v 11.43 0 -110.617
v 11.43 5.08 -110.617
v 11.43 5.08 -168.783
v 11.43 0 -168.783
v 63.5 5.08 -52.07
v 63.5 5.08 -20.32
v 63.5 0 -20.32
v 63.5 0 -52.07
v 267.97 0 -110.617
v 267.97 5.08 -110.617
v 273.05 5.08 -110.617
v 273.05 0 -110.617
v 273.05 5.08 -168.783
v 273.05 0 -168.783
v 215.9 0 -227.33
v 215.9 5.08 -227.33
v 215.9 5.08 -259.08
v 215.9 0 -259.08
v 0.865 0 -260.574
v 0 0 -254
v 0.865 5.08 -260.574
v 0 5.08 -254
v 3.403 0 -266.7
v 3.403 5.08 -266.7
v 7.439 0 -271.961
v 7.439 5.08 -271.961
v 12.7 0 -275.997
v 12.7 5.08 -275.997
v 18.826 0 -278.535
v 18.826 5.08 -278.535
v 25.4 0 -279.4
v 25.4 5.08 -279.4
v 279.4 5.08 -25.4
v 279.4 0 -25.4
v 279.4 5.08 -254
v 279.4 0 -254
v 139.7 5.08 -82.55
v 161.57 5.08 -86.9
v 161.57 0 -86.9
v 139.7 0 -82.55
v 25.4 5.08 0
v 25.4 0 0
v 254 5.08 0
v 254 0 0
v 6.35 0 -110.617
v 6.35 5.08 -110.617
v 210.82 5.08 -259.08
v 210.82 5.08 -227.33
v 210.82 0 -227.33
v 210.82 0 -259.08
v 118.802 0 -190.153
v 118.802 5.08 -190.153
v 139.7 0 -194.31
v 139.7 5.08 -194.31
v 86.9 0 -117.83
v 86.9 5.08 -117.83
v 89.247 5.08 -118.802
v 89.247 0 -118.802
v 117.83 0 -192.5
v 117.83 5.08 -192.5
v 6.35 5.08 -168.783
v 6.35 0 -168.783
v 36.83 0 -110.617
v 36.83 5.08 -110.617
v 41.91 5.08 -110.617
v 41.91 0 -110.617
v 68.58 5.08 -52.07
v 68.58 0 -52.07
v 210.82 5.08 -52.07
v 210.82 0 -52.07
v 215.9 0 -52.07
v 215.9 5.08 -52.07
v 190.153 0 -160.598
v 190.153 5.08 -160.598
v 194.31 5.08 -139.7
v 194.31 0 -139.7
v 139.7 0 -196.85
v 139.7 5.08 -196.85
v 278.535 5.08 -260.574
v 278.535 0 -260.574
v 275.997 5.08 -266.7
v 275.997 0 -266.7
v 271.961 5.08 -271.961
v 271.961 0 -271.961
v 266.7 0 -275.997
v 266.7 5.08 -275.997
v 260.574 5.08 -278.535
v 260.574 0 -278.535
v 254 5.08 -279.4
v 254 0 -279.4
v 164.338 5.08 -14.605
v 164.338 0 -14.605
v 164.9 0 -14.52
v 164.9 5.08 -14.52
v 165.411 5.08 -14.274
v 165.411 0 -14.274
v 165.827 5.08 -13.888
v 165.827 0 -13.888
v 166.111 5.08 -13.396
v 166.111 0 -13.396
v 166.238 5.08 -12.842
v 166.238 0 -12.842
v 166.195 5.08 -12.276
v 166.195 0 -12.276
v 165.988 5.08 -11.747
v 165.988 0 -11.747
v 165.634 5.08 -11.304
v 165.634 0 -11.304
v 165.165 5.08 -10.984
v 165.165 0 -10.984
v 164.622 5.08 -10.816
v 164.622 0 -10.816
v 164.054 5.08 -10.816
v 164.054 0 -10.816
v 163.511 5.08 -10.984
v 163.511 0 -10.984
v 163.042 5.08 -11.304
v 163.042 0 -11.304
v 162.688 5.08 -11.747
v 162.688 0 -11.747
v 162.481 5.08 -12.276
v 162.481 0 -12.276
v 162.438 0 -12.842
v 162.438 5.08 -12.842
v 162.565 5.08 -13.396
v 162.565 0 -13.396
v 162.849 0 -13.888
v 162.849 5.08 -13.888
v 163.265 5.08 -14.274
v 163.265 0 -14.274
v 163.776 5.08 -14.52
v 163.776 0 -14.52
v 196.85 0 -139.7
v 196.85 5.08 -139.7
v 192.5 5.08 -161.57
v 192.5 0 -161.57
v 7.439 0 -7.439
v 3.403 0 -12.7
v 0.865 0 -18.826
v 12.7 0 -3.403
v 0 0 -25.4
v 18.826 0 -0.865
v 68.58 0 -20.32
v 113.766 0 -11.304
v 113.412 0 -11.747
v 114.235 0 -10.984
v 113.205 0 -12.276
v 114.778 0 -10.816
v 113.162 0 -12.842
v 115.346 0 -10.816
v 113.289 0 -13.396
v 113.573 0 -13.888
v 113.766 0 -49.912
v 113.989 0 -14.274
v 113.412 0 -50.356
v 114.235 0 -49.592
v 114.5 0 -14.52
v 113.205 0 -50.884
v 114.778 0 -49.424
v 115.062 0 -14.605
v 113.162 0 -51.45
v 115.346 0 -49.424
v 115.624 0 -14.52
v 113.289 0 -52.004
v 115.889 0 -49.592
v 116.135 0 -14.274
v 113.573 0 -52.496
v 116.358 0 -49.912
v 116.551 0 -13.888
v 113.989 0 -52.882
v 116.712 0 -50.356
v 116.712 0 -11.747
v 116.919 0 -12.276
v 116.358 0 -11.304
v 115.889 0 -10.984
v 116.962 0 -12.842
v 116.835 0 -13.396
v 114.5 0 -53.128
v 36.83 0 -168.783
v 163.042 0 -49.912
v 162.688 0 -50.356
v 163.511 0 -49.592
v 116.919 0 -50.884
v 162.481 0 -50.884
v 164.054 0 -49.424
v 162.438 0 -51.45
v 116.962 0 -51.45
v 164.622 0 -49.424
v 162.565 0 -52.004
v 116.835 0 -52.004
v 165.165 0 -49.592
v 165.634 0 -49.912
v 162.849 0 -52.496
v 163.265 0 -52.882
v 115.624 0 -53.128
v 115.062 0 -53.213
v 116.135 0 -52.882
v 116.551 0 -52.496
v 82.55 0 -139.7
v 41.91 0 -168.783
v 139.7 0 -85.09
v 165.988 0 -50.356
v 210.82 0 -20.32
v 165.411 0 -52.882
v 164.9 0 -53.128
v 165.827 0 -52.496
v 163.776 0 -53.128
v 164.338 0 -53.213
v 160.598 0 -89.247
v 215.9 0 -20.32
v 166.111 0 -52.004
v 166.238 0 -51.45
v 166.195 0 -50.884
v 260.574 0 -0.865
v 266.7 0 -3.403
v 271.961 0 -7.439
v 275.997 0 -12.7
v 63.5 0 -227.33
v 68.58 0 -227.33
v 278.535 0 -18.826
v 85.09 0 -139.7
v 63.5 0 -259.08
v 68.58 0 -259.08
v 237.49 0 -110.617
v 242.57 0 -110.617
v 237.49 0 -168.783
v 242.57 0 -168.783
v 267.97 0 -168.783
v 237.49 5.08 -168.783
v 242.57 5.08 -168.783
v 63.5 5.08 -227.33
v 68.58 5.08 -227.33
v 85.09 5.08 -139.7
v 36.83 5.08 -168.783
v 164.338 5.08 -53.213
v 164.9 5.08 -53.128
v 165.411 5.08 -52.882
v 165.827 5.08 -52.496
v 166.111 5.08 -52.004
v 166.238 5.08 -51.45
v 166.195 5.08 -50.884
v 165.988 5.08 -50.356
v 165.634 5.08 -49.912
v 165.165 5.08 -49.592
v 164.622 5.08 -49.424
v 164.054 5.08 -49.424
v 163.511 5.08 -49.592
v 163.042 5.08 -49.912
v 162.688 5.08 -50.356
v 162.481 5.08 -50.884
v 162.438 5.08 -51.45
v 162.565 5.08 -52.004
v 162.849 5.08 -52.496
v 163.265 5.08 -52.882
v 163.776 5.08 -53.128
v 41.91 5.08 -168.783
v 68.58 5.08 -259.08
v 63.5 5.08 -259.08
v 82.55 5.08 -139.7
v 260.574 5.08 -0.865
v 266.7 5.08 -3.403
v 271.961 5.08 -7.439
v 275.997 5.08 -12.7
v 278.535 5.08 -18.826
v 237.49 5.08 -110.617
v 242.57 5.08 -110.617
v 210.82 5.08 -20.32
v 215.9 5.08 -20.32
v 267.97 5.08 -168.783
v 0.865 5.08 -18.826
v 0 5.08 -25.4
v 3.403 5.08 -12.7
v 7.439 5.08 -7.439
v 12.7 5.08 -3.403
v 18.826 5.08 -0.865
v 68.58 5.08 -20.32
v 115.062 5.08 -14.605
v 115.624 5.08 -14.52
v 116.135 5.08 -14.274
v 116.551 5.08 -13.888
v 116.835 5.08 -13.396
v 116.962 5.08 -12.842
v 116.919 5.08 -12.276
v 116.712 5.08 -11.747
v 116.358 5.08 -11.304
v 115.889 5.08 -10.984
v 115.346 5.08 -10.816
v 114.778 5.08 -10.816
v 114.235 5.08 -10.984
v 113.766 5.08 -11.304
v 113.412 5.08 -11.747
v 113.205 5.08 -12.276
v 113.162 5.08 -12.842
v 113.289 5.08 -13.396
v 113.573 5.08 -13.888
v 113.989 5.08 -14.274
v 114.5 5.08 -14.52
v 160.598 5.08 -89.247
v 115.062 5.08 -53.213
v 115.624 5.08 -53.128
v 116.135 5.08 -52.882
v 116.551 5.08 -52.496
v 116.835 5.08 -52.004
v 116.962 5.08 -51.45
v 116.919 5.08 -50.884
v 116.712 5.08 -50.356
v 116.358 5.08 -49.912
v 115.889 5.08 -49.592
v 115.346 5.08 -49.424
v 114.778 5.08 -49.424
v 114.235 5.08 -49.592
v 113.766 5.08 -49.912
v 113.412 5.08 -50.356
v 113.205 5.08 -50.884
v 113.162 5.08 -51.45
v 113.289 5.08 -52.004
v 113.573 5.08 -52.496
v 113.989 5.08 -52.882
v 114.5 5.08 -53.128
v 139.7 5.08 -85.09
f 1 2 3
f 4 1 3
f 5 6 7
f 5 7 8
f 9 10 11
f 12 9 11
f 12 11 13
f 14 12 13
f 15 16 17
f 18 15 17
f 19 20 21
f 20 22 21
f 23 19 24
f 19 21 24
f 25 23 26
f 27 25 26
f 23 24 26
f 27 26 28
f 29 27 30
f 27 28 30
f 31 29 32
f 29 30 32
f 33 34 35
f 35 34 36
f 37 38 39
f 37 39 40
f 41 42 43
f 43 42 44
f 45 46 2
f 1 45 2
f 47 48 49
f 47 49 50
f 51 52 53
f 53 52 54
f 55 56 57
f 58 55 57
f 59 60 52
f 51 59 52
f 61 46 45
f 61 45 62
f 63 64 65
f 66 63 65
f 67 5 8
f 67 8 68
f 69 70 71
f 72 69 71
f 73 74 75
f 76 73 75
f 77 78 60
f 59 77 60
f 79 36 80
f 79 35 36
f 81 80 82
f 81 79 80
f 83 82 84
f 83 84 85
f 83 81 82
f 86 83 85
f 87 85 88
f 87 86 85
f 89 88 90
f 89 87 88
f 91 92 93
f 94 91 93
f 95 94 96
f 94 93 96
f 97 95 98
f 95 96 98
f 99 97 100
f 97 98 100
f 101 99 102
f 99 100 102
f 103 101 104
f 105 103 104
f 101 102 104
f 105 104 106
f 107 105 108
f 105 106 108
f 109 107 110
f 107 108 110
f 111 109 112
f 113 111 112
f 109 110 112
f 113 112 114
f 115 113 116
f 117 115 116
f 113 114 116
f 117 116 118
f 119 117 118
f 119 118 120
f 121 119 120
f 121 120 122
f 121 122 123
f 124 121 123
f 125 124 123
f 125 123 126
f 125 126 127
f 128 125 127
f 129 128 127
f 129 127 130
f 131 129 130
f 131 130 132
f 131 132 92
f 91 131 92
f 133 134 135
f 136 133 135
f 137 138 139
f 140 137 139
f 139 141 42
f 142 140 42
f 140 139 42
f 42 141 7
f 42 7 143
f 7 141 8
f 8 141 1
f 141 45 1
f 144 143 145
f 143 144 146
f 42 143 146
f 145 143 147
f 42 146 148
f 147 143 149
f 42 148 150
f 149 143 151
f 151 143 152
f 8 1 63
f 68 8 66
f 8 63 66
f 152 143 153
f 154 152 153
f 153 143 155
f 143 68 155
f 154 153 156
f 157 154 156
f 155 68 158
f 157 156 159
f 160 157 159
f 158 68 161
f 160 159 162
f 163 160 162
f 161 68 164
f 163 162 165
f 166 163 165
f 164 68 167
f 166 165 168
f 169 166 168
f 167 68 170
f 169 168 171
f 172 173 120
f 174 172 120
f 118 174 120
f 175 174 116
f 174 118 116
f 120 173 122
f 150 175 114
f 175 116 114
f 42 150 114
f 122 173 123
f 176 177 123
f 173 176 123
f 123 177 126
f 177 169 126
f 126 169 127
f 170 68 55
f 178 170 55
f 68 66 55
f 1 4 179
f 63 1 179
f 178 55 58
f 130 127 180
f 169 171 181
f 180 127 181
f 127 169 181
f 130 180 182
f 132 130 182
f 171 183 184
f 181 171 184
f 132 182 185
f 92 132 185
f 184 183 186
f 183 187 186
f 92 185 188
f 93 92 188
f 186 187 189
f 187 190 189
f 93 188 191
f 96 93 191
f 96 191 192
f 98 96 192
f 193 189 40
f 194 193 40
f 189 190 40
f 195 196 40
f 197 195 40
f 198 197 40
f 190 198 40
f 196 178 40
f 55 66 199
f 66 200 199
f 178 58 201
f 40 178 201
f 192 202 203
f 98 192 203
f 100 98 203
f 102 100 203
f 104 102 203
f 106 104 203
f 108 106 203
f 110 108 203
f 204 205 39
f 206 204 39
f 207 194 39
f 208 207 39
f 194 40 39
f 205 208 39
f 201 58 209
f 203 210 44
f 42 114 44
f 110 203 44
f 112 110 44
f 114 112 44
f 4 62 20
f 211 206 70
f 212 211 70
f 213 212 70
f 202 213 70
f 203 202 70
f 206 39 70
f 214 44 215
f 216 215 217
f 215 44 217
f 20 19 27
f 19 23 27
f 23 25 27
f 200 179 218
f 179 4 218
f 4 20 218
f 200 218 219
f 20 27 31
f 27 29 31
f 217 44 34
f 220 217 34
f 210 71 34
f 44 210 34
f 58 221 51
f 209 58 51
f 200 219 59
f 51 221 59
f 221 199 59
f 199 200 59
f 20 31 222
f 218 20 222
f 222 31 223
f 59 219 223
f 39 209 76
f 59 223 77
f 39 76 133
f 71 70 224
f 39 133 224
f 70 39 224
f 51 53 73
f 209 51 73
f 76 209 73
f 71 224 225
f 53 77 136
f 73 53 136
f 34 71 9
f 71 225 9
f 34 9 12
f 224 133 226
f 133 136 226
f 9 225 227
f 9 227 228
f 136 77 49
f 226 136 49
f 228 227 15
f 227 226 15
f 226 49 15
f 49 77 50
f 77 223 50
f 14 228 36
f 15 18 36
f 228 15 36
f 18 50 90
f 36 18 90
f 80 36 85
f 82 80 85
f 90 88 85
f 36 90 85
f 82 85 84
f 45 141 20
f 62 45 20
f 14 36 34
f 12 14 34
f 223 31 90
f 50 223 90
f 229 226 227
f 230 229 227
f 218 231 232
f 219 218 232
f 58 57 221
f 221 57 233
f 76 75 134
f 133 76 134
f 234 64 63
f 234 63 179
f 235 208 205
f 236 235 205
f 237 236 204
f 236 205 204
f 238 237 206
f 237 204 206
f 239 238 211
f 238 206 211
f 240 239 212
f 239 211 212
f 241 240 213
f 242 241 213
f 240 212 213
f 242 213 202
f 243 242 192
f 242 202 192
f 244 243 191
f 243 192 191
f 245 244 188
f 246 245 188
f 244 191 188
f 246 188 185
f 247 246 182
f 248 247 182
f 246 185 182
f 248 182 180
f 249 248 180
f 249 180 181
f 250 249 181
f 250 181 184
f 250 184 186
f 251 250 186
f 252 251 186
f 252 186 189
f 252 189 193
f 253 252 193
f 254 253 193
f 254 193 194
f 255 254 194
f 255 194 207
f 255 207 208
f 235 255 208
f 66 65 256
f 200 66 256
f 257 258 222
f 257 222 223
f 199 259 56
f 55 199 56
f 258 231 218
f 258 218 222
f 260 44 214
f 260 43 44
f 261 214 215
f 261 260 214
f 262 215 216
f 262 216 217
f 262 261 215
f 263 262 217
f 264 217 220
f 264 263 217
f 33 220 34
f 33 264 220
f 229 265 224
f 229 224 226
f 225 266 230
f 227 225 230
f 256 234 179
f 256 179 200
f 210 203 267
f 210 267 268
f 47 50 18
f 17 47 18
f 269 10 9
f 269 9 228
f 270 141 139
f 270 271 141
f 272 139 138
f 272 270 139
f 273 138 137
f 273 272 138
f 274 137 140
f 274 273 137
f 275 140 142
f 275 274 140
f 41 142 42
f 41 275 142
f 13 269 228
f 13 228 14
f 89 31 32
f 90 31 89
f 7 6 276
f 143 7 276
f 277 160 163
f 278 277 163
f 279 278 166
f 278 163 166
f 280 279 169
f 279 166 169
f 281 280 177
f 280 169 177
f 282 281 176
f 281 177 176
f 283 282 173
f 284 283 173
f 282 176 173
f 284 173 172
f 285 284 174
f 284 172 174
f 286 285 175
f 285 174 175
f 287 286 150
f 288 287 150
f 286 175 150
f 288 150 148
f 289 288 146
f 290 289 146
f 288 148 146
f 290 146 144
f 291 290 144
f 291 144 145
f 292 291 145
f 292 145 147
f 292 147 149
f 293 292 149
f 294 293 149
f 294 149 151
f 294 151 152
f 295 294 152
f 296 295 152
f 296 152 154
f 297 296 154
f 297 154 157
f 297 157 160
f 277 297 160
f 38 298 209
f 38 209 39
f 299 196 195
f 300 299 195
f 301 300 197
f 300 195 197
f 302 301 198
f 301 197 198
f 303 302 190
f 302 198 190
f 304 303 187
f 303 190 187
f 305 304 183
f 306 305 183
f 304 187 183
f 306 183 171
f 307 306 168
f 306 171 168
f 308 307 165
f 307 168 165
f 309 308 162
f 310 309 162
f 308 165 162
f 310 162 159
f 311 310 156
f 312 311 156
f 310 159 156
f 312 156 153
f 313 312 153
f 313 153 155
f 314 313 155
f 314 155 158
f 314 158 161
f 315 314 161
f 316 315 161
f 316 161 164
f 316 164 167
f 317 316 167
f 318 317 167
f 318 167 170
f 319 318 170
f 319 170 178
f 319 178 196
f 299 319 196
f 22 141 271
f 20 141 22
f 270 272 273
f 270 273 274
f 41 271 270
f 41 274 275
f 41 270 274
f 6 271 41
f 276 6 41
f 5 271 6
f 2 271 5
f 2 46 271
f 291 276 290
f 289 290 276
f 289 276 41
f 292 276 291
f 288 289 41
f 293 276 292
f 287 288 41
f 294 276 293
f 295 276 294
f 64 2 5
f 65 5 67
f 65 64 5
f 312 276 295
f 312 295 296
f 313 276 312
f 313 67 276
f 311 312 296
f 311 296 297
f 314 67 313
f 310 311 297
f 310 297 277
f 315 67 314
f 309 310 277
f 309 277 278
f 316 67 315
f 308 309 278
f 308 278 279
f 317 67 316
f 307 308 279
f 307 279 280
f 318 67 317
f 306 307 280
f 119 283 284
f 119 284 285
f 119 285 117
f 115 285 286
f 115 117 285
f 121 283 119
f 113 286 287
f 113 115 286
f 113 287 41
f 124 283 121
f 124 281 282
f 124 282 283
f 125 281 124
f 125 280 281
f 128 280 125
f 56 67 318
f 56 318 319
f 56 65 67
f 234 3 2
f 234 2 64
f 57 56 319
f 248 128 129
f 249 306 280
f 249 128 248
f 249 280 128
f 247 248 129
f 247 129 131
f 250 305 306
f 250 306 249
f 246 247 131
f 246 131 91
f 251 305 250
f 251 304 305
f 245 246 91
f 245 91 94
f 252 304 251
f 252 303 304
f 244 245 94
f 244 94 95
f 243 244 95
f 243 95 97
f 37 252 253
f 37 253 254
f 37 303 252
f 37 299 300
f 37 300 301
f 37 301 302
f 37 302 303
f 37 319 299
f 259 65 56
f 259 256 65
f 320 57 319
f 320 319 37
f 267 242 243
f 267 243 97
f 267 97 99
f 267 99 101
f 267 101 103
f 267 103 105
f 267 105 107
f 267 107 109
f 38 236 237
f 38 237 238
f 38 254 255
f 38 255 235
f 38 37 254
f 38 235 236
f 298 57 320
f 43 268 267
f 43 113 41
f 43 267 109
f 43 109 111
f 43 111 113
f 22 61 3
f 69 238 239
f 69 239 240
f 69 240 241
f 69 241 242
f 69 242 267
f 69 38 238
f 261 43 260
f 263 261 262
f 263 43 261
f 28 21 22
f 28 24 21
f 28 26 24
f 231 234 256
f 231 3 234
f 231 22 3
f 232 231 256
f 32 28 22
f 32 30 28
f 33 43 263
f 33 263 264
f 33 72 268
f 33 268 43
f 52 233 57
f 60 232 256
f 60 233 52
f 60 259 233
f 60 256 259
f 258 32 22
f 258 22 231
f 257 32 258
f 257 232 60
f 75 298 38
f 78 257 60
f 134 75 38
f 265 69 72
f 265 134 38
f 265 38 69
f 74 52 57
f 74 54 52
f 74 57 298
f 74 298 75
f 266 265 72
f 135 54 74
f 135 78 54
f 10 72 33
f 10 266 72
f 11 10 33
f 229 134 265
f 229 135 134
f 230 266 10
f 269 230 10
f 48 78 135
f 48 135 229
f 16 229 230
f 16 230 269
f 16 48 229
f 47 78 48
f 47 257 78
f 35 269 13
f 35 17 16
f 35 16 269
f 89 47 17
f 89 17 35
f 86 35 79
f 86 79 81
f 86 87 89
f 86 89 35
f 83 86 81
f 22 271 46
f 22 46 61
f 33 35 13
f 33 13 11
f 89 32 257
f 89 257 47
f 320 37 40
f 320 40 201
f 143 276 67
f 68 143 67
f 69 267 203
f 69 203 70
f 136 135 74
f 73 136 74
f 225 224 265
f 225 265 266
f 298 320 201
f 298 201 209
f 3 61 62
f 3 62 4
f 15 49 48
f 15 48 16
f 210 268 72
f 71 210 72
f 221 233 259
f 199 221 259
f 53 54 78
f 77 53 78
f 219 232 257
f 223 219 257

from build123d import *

# Parameters (mm, degrees)
SKETCH1_W           = 279.4
SKETCH1_H           = 279.4
BOSS_EXTRUDE1_DEPTH = 5.08
FILLET1_R           = 25.4
SKETCH2_W           = 5.08
SKETCH2_H           = 31.75
CUT_EXTRUDE1_DEPTH  = 396.163923455
SKETCH3_W           = 5.08
SKETCH3_H           = 58.166
CUT_EXTRUDE2_DEPTH  = 396.163923455
SKETCH5_R           = 1.905
CUT_EXTRUDE4_DEPTH  = 396.163923455
CUT_EXTRUDE6_DEPTH  = 396.163923455


with BuildPart() as part:
    # Sketch1 → Boss-Extrude1 (new body)
    with BuildSketch(Plane(origin=(0, 0, 0), x_dir=(1, 0, 0), z_dir=(0, 1, 0))):
        with Locations((139.7, 139.7)):
            Rectangle(SKETCH1_W, SKETCH1_H)
    extrude(amount=BOSS_EXTRUDE1_DEPTH)

    # Fillet1
    fillet1_edges = [part.edges().sort_by_distance(p)[0] for p in [
        (0, 2.54, -279.4),
        (279.4, 2.54, -279.4),
        (279.4, 2.54, 0),
        (0, 2.54, 0),
    ]]
    fillet(fillet1_edges, radius=FILLET1_R)

    # Sketch2 → Cut-Extrude1 (cut, through all)
    with BuildSketch(Plane(origin=(0, 5.08, 0), x_dir=(1, 0, 0), z_dir=(0, 1, 0))):
        with Locations((66.04, 243.205)):
            Rectangle(SKETCH2_W, SKETCH2_H)
        with Locations((213.36, 243.205)):
            Rectangle(SKETCH2_W, SKETCH2_H)
        with Locations((66.04, 36.195)):
            Rectangle(SKETCH2_W, SKETCH2_H)
        with Locations((213.36, 36.195)):
            Rectangle(SKETCH2_W, SKETCH2_H)
    extrude(amount=-CUT_EXTRUDE1_DEPTH, mode=Mode.SUBTRACT)

    # Sketch3 → Cut-Extrude2 (cut, through all)
    with BuildSketch(Plane(origin=(0, 5.08, 0), x_dir=(1, 0, 0), z_dir=(0, 1, 0))):
        with Locations((8.89, 139.7)):
            Rectangle(SKETCH3_W, SKETCH3_H)
        with Locations((270.51, 139.7)):
            Rectangle(SKETCH3_W, SKETCH3_H)
        with Locations((39.37, 139.7)):
            Rectangle(SKETCH3_W, SKETCH3_H)
        with Locations((240.03, 139.7)):
            Rectangle(SKETCH3_W, SKETCH3_H)
    extrude(amount=-CUT_EXTRUDE2_DEPTH, mode=Mode.SUBTRACT)

    # Sketch5 → Cut-Extrude4 (cut, through all)
    with BuildSketch(Plane.XZ):
        with Locations(Location((115.062, -12.7, 0), (0, 0, 270))):
            Circle(SKETCH5_R)
        with Locations(Location((164.338, -12.7, 0), (0, 0, 270))):
            Circle(SKETCH5_R)
        with Locations(Location((164.338, -51.308, 0), (0, 0, 270))):
            Circle(SKETCH5_R)
        with Locations(Location((115.062, -51.308, 0), (0, 0, 270))):
            Circle(SKETCH5_R)
    extrude(amount=-CUT_EXTRUDE4_DEPTH, mode=Mode.SUBTRACT)

    # Sketch6 → Cut-Extrude6 (cut, through all)
    with BuildSketch(Plane(origin=(0, 5.08, 0), x_dir=(1, 0, 0), z_dir=(0, 1, 0))):
        Polygon((117.82964184, 192.499715283), (118.801657759, 190.15306127), (139.7, 194.31), (139.7, 196.85), align=None)
        Polygon((82.55, 139.7), (86.900284717, 117.82964184), (89.24693873, 118.801657759), (85.09, 139.7), align=None)
        Polygon((160.598342241, 89.24693873), (161.57035816, 86.900284717), (139.7, 82.55), (139.7, 85.09), align=None)
        Polygon((196.85, 139.7), (192.499715283, 161.57035816), (190.15306127, 160.598342241), (194.31, 139.7), align=None)
    extrude(amount=-CUT_EXTRUDE6_DEPTH, mode=Mode.SUBTRACT)


solid = part.part
